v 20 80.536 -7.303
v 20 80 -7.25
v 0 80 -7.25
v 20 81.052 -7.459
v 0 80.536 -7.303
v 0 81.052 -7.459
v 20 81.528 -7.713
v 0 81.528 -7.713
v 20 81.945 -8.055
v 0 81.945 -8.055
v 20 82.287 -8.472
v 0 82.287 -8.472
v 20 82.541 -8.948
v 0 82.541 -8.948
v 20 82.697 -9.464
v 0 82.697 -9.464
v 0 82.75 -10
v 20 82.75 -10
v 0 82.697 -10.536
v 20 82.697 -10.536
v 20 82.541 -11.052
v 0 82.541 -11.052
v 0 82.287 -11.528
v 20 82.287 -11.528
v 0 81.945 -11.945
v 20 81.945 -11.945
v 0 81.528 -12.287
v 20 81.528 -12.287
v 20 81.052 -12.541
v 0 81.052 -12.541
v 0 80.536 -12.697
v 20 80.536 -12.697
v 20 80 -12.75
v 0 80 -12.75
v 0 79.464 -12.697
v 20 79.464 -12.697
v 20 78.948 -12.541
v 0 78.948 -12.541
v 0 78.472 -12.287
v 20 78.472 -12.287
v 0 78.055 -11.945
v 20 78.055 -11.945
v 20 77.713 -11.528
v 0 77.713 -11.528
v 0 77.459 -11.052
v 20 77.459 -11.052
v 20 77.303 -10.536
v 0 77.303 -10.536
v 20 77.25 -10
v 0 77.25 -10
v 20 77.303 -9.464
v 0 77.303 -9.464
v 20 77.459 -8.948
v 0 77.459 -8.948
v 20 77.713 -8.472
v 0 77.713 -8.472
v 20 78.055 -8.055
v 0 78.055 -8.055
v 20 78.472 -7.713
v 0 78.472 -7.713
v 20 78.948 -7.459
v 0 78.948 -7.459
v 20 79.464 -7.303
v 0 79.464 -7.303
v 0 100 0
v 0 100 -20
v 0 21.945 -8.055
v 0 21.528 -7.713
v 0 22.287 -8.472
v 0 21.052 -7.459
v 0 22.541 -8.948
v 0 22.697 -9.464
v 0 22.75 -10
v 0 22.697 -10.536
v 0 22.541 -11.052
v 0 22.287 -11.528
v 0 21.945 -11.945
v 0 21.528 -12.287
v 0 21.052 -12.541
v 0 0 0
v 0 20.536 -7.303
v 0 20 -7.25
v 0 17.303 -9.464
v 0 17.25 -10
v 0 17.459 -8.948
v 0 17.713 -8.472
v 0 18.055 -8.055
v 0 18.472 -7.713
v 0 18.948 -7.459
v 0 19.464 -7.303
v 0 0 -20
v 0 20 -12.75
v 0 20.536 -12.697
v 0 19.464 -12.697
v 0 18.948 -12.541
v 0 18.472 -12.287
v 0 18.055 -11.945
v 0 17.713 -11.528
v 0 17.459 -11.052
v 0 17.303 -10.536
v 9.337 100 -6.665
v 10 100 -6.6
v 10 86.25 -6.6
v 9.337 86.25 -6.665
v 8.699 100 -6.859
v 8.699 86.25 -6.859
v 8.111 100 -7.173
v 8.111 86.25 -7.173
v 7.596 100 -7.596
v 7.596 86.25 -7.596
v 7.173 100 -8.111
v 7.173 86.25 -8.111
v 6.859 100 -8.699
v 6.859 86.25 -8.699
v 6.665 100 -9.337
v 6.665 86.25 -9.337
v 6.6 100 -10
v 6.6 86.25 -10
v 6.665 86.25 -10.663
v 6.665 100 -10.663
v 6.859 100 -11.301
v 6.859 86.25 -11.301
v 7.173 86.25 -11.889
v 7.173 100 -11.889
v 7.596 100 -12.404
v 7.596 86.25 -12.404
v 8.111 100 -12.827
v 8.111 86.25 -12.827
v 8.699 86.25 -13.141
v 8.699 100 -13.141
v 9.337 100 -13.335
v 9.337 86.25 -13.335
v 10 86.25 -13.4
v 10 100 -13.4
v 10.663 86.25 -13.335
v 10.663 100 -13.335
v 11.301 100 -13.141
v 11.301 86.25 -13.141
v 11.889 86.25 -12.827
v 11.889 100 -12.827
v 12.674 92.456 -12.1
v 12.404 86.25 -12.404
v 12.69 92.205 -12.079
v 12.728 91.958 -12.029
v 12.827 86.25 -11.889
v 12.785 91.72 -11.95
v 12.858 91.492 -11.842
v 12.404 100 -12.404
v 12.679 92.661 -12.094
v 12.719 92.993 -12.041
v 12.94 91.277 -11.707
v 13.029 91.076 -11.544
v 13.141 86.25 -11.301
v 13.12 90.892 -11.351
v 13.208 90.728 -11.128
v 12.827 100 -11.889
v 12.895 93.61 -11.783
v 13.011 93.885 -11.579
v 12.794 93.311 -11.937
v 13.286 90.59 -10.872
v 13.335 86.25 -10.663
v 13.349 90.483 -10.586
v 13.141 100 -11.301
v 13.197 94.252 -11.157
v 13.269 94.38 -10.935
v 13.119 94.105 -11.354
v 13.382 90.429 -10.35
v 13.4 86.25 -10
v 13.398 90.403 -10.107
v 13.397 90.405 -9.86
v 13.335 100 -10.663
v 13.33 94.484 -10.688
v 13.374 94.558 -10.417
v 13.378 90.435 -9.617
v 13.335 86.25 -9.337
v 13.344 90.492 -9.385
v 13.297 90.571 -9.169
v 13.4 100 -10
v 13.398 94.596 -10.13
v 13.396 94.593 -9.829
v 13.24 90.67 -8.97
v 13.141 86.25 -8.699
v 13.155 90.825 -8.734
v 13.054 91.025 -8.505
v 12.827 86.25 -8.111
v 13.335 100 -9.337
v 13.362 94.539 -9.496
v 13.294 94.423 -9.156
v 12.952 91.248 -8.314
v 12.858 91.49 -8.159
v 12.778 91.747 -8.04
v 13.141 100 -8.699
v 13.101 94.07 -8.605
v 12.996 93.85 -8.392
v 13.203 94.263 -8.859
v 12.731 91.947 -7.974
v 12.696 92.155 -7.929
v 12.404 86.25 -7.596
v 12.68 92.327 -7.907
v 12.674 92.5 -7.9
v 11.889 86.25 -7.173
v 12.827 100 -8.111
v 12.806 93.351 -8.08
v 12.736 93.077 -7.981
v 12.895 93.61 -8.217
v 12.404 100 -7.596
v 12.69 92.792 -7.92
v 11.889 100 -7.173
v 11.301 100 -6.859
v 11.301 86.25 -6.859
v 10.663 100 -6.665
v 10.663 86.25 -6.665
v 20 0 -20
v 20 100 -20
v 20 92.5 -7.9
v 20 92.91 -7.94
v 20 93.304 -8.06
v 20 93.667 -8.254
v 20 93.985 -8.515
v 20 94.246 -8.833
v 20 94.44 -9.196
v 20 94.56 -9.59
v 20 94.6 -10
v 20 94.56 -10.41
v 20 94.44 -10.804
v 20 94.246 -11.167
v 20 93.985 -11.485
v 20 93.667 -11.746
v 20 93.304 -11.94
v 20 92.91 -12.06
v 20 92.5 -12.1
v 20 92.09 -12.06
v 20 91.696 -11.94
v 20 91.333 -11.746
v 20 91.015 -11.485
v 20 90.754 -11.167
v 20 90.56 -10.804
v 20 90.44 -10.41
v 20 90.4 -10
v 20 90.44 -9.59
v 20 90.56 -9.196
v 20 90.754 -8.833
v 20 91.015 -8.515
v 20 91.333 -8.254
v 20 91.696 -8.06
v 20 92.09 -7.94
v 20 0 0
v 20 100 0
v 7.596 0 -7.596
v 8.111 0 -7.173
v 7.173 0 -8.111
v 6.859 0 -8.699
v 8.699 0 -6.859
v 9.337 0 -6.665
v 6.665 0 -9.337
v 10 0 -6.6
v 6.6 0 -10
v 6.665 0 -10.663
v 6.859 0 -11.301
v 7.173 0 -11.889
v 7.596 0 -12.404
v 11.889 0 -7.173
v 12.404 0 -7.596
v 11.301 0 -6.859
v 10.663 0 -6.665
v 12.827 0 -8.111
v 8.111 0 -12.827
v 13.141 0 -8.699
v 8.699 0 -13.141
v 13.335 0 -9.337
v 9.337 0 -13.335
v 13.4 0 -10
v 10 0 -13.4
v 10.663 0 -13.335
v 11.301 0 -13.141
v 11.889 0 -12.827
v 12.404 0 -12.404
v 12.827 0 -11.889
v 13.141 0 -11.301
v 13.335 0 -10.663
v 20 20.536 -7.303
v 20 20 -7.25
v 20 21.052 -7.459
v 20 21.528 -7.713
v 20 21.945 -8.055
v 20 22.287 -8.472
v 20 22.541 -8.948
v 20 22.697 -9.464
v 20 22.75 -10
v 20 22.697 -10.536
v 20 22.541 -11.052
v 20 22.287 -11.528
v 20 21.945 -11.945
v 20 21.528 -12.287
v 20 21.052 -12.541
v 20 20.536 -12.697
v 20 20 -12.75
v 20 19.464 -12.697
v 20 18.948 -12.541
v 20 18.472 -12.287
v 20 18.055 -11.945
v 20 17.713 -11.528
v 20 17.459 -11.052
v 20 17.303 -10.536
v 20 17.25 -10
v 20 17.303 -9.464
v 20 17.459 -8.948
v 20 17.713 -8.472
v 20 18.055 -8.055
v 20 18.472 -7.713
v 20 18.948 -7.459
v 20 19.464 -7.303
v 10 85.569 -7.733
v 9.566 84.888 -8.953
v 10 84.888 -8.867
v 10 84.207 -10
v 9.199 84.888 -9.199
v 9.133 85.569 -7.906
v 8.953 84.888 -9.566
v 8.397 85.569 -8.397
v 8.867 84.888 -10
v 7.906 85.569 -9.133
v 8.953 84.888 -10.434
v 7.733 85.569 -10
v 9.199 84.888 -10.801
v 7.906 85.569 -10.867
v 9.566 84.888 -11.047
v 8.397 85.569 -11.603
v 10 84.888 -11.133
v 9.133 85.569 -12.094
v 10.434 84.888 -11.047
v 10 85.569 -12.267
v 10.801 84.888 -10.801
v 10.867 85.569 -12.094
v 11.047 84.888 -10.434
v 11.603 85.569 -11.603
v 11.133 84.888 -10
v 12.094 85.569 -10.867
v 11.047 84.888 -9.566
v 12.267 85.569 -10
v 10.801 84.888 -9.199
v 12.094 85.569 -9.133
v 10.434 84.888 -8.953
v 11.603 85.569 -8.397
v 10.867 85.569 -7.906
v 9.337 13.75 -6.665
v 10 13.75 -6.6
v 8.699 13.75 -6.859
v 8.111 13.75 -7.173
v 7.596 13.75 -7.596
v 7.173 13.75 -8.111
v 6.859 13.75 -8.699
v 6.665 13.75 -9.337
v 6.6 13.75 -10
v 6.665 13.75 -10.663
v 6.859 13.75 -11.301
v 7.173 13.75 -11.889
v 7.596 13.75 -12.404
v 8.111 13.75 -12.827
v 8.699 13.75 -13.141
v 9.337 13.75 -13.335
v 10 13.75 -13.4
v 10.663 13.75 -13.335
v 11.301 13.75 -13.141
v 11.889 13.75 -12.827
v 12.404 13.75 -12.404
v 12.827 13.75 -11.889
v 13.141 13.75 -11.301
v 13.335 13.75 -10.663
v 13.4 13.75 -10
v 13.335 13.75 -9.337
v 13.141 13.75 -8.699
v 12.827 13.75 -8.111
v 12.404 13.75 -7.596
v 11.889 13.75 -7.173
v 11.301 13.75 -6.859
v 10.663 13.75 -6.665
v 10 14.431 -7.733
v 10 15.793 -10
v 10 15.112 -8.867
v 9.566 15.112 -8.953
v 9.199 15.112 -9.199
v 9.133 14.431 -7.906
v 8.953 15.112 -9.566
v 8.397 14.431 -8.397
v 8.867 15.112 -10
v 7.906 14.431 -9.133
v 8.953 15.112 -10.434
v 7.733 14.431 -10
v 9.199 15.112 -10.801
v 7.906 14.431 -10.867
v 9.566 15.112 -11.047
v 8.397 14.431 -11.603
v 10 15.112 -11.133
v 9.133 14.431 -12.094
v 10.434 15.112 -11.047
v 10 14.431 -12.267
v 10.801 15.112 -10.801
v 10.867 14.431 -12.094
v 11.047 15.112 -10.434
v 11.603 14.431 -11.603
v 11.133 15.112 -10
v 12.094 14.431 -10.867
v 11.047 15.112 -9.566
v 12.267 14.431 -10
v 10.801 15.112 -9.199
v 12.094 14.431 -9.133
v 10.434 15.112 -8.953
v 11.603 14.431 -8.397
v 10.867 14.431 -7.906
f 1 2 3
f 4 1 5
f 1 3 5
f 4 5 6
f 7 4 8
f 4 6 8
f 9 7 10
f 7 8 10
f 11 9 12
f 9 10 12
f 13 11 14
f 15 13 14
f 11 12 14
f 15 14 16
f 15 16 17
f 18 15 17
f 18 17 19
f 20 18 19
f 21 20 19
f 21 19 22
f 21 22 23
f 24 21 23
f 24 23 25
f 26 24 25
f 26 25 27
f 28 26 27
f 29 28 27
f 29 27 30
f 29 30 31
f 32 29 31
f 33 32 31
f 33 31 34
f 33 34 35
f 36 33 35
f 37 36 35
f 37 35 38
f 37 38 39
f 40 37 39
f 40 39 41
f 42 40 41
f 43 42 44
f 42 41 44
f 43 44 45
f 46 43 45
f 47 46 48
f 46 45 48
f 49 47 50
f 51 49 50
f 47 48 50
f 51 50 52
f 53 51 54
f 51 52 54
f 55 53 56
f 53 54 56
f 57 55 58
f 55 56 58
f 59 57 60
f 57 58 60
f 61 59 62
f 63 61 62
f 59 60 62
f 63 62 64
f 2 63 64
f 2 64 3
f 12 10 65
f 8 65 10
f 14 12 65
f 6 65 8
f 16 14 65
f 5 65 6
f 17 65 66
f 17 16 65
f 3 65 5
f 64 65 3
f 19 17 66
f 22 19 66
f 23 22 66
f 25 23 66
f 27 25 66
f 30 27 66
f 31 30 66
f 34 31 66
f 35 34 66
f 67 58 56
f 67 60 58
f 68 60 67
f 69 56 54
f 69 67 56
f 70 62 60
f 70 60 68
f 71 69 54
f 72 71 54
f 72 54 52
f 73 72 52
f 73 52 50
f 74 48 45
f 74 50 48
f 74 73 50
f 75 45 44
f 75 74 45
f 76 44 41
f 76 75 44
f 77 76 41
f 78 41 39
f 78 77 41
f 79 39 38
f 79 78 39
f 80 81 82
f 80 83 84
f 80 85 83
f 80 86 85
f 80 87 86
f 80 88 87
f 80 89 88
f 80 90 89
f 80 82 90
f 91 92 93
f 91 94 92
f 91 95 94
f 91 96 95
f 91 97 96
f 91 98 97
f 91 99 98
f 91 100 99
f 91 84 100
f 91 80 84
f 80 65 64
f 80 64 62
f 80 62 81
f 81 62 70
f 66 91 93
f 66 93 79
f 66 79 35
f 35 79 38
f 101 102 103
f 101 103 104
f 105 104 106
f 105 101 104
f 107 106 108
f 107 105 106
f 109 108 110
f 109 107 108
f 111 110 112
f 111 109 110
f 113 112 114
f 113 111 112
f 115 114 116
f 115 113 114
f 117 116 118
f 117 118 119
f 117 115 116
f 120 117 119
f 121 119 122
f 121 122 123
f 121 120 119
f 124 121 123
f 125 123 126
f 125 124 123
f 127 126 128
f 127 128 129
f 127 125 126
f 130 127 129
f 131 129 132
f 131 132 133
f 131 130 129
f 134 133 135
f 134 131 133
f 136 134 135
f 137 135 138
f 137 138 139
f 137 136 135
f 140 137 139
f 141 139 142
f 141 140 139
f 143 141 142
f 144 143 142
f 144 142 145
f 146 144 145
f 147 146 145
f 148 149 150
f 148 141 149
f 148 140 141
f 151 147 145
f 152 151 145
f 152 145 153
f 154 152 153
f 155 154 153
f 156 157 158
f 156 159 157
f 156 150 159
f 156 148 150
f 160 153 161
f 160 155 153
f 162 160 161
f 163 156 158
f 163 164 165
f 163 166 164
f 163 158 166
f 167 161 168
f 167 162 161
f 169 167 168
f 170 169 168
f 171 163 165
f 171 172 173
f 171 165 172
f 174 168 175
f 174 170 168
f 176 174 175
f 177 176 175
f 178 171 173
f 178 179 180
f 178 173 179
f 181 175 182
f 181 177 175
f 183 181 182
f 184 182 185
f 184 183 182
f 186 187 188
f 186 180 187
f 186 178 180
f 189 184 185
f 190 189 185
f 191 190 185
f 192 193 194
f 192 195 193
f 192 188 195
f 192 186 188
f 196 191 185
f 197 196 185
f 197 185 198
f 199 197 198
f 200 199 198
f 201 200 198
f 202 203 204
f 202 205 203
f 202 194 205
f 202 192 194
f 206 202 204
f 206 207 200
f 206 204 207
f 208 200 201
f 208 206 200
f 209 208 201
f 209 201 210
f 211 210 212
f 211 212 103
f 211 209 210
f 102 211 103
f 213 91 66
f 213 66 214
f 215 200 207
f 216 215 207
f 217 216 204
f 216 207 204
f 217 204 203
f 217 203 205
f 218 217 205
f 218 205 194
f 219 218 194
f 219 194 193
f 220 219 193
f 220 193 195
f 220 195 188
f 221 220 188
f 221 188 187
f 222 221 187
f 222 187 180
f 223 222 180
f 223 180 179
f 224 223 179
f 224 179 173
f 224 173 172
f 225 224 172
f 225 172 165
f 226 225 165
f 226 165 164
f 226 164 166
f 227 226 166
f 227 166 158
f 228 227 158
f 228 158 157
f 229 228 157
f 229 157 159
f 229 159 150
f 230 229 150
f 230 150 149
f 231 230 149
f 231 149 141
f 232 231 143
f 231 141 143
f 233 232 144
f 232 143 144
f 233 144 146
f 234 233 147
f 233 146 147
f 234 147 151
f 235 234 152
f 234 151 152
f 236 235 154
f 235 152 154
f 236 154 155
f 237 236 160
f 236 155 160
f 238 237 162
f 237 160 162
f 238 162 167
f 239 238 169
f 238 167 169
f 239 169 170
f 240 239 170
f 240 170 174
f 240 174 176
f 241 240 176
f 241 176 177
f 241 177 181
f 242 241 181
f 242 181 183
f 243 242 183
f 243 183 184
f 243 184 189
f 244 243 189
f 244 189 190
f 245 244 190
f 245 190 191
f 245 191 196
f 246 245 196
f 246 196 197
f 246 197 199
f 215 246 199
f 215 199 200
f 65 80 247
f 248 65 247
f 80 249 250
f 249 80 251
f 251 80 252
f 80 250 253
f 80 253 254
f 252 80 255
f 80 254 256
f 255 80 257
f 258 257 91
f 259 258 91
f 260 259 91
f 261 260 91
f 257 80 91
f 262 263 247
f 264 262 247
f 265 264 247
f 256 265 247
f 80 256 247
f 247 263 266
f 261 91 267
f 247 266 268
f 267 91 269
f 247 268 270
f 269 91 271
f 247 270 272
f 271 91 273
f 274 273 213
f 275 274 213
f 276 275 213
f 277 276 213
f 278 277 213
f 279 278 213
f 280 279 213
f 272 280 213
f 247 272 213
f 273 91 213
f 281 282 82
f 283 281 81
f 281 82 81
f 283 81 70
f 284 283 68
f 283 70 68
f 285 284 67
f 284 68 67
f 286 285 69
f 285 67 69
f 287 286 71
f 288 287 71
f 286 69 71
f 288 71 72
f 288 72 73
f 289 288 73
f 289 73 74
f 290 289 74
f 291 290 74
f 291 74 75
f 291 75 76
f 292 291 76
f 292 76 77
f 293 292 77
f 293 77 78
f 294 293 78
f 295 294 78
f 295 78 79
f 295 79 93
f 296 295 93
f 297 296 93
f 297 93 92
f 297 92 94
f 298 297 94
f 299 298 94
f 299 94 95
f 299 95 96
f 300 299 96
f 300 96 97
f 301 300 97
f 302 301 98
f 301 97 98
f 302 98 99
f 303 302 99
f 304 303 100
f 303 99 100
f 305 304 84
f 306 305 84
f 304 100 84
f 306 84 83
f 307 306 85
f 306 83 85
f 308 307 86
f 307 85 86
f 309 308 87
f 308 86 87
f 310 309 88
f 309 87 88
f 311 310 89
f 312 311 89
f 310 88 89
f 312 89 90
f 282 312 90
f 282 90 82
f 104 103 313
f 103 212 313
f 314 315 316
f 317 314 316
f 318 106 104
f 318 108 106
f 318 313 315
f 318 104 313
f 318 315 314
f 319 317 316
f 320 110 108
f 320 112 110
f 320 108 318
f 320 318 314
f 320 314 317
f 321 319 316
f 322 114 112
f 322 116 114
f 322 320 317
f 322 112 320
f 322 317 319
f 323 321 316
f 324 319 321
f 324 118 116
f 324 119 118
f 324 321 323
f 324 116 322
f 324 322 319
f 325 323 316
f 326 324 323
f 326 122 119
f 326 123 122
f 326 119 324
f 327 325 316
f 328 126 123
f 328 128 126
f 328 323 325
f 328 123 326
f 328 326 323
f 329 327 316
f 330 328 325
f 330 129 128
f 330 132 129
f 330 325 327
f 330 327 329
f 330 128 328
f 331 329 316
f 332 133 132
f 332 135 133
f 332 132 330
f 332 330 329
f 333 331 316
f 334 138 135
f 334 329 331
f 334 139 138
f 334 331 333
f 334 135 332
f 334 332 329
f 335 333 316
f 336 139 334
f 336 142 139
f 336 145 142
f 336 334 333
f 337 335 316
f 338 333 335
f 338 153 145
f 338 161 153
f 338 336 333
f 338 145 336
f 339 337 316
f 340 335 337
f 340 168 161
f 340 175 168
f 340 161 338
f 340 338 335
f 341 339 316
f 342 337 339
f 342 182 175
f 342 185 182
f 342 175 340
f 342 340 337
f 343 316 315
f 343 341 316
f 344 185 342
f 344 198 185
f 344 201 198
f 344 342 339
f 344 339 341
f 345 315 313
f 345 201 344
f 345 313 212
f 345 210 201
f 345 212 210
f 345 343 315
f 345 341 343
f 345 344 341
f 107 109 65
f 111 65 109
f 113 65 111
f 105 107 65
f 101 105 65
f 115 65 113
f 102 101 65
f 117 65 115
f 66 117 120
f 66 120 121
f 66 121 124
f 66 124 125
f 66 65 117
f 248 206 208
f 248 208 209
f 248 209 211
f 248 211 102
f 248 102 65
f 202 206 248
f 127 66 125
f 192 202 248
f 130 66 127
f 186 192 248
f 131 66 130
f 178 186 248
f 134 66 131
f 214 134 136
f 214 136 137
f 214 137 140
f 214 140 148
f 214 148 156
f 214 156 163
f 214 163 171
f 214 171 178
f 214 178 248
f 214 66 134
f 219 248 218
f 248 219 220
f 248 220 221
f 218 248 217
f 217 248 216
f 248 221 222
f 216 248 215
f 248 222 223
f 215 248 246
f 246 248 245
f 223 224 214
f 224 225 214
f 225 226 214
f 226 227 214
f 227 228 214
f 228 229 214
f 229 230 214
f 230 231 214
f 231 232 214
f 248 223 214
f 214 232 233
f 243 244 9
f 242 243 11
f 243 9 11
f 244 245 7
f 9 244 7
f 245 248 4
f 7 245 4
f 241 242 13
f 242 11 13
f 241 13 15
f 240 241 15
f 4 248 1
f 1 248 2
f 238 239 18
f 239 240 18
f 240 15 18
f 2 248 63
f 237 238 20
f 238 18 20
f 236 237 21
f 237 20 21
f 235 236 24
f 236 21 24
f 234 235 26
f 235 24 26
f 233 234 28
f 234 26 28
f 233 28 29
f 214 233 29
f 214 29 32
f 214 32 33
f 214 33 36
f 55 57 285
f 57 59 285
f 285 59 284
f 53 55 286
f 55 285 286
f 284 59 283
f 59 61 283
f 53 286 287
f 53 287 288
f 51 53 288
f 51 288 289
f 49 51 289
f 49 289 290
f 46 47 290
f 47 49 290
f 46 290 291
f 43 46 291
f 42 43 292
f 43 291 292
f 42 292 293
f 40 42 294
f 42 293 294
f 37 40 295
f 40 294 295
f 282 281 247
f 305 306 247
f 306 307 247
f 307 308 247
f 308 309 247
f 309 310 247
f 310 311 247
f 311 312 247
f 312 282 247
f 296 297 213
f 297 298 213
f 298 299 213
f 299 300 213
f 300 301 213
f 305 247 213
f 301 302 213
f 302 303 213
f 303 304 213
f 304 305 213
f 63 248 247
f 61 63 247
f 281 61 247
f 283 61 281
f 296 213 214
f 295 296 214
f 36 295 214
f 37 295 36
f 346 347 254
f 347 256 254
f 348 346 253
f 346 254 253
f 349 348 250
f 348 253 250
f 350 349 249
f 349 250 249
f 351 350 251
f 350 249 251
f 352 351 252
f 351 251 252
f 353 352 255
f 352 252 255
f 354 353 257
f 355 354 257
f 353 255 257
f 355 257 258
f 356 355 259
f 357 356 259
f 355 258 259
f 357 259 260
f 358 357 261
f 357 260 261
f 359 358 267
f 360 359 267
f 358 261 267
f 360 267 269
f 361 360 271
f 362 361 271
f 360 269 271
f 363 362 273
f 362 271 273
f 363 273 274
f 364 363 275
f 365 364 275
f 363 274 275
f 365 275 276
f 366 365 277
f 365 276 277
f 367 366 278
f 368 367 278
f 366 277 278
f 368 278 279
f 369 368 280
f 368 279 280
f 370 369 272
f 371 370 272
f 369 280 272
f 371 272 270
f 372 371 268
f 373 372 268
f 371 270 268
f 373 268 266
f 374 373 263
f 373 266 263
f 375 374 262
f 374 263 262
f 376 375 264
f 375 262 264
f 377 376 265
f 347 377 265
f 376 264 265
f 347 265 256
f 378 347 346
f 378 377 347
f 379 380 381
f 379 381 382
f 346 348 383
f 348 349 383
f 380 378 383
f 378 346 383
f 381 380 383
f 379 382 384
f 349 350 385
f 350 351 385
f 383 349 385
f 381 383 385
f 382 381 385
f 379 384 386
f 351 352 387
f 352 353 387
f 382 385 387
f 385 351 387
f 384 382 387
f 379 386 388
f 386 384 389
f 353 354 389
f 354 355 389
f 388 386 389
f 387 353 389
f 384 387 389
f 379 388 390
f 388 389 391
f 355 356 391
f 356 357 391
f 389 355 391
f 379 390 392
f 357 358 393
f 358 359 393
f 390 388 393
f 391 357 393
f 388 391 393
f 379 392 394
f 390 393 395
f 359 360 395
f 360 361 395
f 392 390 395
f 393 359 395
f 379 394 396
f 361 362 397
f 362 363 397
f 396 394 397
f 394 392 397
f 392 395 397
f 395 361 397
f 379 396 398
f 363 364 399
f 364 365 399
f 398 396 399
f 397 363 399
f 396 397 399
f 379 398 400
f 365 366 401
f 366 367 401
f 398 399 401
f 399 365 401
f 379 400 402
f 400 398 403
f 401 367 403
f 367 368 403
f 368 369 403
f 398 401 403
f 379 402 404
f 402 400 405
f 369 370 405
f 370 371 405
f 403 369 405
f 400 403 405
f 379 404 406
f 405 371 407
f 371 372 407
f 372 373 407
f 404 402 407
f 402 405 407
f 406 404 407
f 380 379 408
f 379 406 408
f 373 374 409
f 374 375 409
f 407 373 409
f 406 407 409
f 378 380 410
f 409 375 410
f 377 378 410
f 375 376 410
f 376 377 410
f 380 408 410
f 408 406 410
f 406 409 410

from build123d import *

# Parameters (mm, degrees)
SKETCH1_W             = 20
SKETCH1_H             = 20
BOSS_EXTRUDE1_DEPTH   = 100
M5_CLEARANCE_HOLE1_D  = 5.5
M5_TAPPED_HOLE3_D     = 4.2
M5_TAPPED_HOLE3_DEPTH = 10.4
M5_TAPPED_HOLE3_TIP   = 1.2618073


with BuildPart() as part:
    # Sketch1 → Boss-Extrude1 (new body)
    with BuildSketch(Plane(origin=(0, 0, 0), x_dir=(1, 0, 0), z_dir=(0, 1, 0))):
        with Locations((10, 10)):
            Rectangle(SKETCH1_W, SKETCH1_H)
    extrude(amount=BOSS_EXTRUDE1_DEPTH)

    # Sketch5 → M8 Tapped Hole1 (revolve, cut)
    with BuildSketch(Plane(origin=(10, 100, -10), x_dir=(0, 0, 1), z_dir=(1, 0, 0))):
        Polygon((0, 0), (0, 15.792926105), (3.4, 13.75), (3.4, 0), align=None)
    m8_tapped_hole1 = revolve(axis=Axis((10, 106.35, -10), (0, -1, 0)), mode=Mode.SUBTRACT)

    # Mirror1: M8 Tapped Hole1 across plane
    add(m8_tapped_hole1.mirror(Plane.ZX.offset(50)), mode=Mode.SUBTRACT)

    # M5 Clearance Hole1 (through all)
    with Locations(Plane(origin=(20, 0, 0), x_dir=(0, 0, -1), z_dir=(1, 0, 0))):
        with Locations((10, 20), (10, 80)):
            Hole(M5_CLEARANCE_HOLE1_D / 2)

    # M5 Tapped Hole3
    with Locations(Plane(origin=(20, 0, 0), x_dir=(0, 0, -1), z_dir=(1, 0, 0))):
        with Locations((10, 92.5)):
            Hole(M5_TAPPED_HOLE3_D / 2, depth=M5_TAPPED_HOLE3_DEPTH)
            with Locations((0, 0, -(M5_TAPPED_HOLE3_DEPTH + M5_TAPPED_HOLE3_TIP / 2))):  # 118° drill point
                Cone(0, M5_TAPPED_HOLE3_D / 2, M5_TAPPED_HOLE3_TIP, mode=Mode.SUBTRACT)


solid = part.part
